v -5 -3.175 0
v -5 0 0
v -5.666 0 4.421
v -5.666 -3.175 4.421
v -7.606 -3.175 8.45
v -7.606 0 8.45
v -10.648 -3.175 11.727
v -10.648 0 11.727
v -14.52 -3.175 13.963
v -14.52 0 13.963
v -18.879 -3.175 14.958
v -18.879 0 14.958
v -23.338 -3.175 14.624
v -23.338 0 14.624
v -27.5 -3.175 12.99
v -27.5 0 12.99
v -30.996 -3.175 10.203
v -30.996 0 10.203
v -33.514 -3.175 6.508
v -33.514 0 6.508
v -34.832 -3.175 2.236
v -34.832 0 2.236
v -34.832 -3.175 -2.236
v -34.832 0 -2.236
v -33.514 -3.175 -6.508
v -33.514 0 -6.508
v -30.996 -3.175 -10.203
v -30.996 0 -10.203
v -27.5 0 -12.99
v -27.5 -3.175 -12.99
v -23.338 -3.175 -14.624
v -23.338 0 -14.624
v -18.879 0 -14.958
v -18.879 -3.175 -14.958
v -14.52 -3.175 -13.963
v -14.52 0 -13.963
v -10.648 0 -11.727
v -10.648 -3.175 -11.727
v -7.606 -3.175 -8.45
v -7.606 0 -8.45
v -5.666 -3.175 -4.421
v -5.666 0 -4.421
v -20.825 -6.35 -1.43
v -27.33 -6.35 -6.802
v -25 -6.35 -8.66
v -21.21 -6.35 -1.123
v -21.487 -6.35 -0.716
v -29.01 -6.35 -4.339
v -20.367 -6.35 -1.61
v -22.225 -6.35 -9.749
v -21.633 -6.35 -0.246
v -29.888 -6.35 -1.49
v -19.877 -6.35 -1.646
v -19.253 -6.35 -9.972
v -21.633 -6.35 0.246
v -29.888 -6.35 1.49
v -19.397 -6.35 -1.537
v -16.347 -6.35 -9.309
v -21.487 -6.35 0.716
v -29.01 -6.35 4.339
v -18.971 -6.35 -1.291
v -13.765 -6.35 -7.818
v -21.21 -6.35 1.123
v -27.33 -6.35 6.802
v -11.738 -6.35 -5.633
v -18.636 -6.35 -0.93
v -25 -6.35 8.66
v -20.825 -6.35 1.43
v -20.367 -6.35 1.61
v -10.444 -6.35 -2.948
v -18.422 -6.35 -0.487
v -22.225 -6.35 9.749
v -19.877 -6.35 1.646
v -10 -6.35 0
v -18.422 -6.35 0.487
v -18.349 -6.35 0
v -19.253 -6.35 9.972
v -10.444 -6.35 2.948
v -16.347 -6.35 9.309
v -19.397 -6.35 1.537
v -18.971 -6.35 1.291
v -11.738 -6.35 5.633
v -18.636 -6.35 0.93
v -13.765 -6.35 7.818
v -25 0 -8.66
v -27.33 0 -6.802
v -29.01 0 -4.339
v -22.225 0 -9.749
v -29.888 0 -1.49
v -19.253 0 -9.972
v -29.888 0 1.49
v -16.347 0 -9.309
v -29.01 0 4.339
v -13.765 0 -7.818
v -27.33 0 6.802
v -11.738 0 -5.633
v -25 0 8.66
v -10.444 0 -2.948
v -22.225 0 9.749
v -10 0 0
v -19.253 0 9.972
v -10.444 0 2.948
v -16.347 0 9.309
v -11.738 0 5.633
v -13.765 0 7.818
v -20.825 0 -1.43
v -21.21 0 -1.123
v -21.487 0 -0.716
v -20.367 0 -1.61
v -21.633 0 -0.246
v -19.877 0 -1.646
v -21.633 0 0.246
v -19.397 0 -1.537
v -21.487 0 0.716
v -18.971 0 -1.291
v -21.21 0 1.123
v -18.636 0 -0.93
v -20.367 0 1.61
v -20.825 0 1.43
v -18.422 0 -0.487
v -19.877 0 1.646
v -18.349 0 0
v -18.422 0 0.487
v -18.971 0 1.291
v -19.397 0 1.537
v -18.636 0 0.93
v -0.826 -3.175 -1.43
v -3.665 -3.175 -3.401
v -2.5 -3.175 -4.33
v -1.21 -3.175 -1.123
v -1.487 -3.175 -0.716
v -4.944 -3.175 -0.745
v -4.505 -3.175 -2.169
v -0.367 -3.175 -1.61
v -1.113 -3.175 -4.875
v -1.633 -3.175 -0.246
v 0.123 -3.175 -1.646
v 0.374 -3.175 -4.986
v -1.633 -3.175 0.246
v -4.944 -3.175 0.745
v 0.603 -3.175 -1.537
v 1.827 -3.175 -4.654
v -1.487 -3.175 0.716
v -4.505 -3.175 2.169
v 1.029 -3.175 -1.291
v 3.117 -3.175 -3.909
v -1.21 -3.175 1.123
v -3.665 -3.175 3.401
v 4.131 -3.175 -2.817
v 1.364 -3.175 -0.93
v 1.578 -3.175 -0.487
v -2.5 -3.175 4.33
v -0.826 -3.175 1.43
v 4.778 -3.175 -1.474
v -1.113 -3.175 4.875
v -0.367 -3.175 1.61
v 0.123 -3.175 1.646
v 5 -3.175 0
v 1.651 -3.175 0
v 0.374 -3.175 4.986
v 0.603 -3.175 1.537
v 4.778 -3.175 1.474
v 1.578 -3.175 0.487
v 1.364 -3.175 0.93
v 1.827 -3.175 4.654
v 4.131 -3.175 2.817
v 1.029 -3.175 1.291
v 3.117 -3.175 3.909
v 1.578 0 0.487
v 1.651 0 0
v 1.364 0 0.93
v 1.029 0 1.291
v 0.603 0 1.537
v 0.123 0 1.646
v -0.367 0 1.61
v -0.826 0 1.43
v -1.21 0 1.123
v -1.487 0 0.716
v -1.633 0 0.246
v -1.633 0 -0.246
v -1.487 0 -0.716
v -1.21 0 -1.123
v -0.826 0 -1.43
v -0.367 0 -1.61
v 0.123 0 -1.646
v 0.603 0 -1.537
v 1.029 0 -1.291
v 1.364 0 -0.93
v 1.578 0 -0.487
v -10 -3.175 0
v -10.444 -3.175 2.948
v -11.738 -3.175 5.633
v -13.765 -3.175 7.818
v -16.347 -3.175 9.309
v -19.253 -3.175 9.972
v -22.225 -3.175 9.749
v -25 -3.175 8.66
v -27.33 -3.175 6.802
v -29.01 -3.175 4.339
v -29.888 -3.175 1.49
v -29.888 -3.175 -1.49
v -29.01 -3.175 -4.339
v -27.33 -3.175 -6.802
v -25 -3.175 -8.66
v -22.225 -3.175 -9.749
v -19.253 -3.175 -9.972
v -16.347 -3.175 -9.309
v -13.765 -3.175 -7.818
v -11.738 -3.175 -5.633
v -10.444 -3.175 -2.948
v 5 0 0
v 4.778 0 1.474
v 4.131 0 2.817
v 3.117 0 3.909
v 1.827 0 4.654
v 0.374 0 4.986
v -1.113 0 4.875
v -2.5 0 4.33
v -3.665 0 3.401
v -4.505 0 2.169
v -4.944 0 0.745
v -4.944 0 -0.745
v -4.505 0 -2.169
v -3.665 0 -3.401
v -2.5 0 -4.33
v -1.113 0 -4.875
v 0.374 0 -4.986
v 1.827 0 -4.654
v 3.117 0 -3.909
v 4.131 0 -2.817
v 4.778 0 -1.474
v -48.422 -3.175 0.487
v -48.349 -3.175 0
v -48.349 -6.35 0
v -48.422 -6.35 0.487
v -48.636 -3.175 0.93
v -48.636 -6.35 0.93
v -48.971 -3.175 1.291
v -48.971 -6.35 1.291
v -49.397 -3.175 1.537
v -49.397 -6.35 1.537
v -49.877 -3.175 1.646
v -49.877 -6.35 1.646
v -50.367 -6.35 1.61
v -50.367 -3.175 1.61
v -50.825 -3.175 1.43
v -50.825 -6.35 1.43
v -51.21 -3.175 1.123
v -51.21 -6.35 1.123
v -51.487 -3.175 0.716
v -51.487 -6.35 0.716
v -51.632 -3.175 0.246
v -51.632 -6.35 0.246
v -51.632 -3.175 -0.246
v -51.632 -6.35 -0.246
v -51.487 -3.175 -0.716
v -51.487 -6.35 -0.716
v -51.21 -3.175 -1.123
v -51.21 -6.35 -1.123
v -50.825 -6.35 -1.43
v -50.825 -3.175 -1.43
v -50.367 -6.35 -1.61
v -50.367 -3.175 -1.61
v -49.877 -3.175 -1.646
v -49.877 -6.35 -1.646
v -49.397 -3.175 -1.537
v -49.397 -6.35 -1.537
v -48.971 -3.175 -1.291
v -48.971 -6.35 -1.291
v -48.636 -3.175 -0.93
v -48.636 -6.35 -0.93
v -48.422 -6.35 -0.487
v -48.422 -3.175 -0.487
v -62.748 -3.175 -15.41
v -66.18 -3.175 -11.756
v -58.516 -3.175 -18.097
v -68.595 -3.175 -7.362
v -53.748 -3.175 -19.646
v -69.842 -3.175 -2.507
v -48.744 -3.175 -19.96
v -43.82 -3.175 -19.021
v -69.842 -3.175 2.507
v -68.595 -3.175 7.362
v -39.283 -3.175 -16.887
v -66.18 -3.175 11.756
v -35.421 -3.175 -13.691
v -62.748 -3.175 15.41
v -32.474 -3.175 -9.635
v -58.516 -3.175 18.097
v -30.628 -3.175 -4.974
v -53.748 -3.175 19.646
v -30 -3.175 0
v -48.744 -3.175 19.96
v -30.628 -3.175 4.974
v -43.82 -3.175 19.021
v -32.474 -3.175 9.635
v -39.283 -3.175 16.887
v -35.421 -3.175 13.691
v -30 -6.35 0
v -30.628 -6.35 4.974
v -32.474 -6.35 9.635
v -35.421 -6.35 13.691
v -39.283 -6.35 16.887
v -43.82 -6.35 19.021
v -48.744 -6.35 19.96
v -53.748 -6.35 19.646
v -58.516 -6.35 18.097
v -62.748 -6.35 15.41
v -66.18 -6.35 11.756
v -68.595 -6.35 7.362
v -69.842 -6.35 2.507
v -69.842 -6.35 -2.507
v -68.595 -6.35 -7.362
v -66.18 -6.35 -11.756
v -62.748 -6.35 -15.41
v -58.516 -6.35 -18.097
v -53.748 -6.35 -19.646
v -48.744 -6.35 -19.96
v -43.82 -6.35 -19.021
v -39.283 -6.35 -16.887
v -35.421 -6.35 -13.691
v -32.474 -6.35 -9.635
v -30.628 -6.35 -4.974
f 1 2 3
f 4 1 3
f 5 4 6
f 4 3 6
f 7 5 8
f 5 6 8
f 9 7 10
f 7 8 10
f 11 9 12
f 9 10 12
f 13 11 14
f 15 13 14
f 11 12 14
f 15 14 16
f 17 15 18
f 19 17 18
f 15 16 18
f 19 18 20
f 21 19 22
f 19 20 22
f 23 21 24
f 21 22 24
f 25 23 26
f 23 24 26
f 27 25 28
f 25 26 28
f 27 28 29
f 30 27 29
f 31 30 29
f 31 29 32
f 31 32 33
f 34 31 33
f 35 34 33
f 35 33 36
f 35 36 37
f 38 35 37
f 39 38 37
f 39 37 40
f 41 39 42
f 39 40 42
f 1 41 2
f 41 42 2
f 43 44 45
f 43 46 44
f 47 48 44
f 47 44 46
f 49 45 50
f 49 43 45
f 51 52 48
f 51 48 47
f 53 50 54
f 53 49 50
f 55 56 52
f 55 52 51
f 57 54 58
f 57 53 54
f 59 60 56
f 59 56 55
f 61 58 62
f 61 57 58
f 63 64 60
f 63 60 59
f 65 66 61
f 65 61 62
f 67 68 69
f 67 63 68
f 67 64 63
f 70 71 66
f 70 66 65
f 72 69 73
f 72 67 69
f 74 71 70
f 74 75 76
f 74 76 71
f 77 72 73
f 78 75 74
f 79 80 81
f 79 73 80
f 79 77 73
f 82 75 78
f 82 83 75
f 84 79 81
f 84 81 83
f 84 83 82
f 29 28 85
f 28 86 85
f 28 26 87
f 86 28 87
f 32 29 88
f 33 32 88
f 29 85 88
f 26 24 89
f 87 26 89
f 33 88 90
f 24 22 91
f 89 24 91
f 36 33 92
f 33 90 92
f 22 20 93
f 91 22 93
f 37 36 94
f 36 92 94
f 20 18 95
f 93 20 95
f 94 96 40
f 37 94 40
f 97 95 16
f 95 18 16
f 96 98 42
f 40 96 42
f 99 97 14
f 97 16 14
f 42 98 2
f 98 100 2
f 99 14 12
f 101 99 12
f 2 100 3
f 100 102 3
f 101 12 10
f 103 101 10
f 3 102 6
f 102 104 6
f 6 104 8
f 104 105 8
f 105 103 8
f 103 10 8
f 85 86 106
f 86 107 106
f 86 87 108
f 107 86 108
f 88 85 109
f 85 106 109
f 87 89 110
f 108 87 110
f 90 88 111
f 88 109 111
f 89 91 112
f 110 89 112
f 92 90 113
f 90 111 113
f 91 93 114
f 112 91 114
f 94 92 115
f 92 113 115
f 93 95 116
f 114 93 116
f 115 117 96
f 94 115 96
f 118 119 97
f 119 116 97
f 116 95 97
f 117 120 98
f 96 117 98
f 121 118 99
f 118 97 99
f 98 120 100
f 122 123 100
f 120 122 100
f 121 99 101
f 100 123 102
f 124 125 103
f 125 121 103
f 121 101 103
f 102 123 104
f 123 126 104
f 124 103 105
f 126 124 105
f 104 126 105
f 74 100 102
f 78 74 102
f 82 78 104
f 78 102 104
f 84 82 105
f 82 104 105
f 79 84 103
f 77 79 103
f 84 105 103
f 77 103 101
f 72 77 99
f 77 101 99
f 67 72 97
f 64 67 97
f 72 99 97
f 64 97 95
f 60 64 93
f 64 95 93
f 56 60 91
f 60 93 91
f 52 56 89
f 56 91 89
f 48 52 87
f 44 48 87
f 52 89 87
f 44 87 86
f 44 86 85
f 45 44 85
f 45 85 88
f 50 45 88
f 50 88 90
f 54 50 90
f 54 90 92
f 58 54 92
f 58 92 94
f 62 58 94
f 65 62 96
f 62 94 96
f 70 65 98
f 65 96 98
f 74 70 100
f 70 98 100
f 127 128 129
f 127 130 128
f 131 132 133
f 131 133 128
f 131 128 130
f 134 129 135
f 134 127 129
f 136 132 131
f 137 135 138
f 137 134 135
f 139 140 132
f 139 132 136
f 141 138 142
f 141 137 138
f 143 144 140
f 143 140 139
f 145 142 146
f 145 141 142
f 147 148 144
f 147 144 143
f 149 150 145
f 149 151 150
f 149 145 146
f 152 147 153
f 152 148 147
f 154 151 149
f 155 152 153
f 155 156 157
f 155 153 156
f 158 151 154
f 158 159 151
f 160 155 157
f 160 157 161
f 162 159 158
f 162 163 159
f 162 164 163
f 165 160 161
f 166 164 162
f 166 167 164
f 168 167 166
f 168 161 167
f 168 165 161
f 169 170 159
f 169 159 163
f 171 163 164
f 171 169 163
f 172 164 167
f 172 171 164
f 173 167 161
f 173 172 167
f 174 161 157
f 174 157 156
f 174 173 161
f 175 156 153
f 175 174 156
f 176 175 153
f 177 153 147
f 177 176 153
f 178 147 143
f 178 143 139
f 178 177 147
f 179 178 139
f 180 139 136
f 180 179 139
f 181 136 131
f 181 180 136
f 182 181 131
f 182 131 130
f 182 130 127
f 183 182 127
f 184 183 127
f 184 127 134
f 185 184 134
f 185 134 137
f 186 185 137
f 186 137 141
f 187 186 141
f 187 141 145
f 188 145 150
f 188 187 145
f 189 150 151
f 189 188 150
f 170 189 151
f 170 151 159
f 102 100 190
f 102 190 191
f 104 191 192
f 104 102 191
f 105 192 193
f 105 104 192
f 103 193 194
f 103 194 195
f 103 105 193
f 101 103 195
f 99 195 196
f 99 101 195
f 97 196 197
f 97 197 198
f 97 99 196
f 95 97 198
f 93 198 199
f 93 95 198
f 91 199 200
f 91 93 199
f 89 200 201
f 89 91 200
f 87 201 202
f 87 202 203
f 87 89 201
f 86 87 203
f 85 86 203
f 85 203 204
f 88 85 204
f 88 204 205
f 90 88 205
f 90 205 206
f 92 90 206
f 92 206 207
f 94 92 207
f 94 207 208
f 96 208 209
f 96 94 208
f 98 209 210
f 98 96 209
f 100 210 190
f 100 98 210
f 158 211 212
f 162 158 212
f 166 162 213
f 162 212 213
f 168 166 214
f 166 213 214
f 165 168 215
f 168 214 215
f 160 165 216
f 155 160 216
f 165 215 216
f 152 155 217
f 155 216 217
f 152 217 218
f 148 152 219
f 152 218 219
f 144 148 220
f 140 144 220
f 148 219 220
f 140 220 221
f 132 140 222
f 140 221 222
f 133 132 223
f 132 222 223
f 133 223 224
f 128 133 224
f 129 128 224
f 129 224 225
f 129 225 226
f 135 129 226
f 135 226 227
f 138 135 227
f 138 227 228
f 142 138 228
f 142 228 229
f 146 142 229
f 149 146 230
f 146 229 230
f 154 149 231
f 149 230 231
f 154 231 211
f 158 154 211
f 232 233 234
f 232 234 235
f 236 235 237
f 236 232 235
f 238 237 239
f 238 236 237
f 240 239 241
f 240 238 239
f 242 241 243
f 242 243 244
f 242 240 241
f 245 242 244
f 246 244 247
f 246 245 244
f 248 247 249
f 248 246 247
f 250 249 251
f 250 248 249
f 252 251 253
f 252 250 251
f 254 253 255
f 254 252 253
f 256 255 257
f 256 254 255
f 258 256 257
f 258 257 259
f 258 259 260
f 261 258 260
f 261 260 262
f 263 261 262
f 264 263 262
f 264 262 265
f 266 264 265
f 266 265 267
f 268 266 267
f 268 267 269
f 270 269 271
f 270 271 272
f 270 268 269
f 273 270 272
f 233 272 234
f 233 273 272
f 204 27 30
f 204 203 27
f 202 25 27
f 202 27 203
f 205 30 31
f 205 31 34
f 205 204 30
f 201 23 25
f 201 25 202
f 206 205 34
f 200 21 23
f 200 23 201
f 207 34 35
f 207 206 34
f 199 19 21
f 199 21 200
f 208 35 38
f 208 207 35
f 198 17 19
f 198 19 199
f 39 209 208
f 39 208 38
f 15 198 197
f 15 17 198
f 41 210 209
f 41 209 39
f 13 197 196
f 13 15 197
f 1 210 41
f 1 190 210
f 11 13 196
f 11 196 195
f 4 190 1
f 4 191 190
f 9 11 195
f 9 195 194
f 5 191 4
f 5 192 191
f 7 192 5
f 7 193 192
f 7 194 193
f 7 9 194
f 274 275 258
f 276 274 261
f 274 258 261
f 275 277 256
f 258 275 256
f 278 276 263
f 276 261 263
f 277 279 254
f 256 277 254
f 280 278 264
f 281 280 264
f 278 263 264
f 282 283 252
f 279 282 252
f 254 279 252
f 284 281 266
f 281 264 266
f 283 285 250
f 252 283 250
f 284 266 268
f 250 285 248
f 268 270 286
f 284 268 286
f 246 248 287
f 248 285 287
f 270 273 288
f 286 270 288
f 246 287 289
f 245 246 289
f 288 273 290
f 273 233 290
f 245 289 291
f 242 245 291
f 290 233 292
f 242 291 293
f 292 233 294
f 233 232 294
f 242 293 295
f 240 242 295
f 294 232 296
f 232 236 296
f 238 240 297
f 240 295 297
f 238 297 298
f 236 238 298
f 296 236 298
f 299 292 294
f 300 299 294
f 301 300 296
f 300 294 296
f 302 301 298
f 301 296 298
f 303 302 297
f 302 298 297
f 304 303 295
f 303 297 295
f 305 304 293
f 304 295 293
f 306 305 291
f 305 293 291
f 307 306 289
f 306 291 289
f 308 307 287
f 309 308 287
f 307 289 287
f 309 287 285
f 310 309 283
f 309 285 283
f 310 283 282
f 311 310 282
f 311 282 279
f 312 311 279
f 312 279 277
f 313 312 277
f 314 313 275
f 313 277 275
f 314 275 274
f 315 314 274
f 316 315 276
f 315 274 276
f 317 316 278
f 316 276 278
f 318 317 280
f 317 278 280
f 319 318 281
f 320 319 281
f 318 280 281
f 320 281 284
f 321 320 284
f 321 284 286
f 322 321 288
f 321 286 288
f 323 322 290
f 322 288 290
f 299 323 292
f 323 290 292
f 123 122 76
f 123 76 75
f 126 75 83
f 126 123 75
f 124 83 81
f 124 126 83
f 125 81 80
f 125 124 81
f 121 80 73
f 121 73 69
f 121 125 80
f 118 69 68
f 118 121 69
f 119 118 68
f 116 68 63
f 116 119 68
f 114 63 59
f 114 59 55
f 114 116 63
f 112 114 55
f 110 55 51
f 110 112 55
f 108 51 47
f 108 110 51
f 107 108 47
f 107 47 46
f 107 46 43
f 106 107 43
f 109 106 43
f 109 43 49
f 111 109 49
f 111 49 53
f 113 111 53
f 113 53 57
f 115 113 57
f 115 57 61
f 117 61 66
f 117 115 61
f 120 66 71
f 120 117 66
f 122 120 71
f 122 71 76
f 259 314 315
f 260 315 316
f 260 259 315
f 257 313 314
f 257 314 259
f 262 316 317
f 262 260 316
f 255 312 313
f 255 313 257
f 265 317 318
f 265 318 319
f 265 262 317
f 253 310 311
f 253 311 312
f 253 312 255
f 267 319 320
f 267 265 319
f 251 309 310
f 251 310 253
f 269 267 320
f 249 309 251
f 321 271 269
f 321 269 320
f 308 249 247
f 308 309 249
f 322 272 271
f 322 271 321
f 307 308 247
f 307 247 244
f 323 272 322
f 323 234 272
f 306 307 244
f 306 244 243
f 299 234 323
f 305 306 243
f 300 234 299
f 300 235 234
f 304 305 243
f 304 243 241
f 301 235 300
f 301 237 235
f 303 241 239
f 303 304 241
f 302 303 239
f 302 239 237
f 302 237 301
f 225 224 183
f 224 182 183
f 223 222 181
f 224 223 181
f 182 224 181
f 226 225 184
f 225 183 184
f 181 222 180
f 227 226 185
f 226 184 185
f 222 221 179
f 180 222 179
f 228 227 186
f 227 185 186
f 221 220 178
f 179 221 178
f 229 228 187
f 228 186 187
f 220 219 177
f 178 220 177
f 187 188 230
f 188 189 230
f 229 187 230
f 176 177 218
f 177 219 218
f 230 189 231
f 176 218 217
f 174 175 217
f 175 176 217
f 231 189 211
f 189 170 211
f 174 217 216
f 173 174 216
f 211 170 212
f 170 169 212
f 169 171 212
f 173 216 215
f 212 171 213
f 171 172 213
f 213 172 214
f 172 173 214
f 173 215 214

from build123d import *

# Parameters (mm, degrees)
F0_R     = 1.651
F1_DEPTH = 3.175
F0_R_2   = 14.99997
F0_R_3   = 10.000005
F2_DEPTH = 3.175
F3_DEPTH = 6.35
F4_R     = 19.99996
F4_R_2   = 1.651
F5_DEPTH = 3.175


with BuildPart() as f1:
    # F0 (on Front) → F1 (new body)
    with BuildSketch(Plane.XZ):
        with BuildLine():
            ThreePointArc((-5.000003, 0), (0, -5.000003), (5.000003, 0))
            ThreePointArc((5.000003, 0), (0, 5.000003), (-5.000003, 0))
        make_face()
        Circle(F0_R, mode=Mode.SUBTRACT)
    extrude(amount=F1_DEPTH)


with BuildPart() as f2:
    # F0 (on Front) → F2 (new body)
    with BuildSketch(Plane.XZ):
        with Locations((-19.999973, 0)):
            Circle(F0_R_2)
        with Locations((-19.999973, 0)):
            Circle(F0_R_3, mode=Mode.SUBTRACT)
    extrude(amount=F2_DEPTH)


with BuildPart() as f3:
    # F0 (on Front) → F3 (new body)
    with BuildSketch(Plane.XZ):
        with Locations((-19.999973, 0)):
            Circle(F0_R_3)
        with Locations((-19.999973, 0)):
            Circle(F0_R, mode=Mode.SUBTRACT)
    extrude(amount=F3_DEPTH)


with BuildPart() as f5:
    # F4 (on face) → F5 (new body)
    with BuildSketch(Plane.XZ.offset(3.175)):
        with Locations((-49.999938, 0)):
            Circle(F4_R)
        with Locations((-49.999938, 0)):
            Circle(F4_R_2, mode=Mode.SUBTRACT)
    extrude(amount=F5_DEPTH)


solid = Compound([f1.part, f2.part, f3.part, f5.part])
